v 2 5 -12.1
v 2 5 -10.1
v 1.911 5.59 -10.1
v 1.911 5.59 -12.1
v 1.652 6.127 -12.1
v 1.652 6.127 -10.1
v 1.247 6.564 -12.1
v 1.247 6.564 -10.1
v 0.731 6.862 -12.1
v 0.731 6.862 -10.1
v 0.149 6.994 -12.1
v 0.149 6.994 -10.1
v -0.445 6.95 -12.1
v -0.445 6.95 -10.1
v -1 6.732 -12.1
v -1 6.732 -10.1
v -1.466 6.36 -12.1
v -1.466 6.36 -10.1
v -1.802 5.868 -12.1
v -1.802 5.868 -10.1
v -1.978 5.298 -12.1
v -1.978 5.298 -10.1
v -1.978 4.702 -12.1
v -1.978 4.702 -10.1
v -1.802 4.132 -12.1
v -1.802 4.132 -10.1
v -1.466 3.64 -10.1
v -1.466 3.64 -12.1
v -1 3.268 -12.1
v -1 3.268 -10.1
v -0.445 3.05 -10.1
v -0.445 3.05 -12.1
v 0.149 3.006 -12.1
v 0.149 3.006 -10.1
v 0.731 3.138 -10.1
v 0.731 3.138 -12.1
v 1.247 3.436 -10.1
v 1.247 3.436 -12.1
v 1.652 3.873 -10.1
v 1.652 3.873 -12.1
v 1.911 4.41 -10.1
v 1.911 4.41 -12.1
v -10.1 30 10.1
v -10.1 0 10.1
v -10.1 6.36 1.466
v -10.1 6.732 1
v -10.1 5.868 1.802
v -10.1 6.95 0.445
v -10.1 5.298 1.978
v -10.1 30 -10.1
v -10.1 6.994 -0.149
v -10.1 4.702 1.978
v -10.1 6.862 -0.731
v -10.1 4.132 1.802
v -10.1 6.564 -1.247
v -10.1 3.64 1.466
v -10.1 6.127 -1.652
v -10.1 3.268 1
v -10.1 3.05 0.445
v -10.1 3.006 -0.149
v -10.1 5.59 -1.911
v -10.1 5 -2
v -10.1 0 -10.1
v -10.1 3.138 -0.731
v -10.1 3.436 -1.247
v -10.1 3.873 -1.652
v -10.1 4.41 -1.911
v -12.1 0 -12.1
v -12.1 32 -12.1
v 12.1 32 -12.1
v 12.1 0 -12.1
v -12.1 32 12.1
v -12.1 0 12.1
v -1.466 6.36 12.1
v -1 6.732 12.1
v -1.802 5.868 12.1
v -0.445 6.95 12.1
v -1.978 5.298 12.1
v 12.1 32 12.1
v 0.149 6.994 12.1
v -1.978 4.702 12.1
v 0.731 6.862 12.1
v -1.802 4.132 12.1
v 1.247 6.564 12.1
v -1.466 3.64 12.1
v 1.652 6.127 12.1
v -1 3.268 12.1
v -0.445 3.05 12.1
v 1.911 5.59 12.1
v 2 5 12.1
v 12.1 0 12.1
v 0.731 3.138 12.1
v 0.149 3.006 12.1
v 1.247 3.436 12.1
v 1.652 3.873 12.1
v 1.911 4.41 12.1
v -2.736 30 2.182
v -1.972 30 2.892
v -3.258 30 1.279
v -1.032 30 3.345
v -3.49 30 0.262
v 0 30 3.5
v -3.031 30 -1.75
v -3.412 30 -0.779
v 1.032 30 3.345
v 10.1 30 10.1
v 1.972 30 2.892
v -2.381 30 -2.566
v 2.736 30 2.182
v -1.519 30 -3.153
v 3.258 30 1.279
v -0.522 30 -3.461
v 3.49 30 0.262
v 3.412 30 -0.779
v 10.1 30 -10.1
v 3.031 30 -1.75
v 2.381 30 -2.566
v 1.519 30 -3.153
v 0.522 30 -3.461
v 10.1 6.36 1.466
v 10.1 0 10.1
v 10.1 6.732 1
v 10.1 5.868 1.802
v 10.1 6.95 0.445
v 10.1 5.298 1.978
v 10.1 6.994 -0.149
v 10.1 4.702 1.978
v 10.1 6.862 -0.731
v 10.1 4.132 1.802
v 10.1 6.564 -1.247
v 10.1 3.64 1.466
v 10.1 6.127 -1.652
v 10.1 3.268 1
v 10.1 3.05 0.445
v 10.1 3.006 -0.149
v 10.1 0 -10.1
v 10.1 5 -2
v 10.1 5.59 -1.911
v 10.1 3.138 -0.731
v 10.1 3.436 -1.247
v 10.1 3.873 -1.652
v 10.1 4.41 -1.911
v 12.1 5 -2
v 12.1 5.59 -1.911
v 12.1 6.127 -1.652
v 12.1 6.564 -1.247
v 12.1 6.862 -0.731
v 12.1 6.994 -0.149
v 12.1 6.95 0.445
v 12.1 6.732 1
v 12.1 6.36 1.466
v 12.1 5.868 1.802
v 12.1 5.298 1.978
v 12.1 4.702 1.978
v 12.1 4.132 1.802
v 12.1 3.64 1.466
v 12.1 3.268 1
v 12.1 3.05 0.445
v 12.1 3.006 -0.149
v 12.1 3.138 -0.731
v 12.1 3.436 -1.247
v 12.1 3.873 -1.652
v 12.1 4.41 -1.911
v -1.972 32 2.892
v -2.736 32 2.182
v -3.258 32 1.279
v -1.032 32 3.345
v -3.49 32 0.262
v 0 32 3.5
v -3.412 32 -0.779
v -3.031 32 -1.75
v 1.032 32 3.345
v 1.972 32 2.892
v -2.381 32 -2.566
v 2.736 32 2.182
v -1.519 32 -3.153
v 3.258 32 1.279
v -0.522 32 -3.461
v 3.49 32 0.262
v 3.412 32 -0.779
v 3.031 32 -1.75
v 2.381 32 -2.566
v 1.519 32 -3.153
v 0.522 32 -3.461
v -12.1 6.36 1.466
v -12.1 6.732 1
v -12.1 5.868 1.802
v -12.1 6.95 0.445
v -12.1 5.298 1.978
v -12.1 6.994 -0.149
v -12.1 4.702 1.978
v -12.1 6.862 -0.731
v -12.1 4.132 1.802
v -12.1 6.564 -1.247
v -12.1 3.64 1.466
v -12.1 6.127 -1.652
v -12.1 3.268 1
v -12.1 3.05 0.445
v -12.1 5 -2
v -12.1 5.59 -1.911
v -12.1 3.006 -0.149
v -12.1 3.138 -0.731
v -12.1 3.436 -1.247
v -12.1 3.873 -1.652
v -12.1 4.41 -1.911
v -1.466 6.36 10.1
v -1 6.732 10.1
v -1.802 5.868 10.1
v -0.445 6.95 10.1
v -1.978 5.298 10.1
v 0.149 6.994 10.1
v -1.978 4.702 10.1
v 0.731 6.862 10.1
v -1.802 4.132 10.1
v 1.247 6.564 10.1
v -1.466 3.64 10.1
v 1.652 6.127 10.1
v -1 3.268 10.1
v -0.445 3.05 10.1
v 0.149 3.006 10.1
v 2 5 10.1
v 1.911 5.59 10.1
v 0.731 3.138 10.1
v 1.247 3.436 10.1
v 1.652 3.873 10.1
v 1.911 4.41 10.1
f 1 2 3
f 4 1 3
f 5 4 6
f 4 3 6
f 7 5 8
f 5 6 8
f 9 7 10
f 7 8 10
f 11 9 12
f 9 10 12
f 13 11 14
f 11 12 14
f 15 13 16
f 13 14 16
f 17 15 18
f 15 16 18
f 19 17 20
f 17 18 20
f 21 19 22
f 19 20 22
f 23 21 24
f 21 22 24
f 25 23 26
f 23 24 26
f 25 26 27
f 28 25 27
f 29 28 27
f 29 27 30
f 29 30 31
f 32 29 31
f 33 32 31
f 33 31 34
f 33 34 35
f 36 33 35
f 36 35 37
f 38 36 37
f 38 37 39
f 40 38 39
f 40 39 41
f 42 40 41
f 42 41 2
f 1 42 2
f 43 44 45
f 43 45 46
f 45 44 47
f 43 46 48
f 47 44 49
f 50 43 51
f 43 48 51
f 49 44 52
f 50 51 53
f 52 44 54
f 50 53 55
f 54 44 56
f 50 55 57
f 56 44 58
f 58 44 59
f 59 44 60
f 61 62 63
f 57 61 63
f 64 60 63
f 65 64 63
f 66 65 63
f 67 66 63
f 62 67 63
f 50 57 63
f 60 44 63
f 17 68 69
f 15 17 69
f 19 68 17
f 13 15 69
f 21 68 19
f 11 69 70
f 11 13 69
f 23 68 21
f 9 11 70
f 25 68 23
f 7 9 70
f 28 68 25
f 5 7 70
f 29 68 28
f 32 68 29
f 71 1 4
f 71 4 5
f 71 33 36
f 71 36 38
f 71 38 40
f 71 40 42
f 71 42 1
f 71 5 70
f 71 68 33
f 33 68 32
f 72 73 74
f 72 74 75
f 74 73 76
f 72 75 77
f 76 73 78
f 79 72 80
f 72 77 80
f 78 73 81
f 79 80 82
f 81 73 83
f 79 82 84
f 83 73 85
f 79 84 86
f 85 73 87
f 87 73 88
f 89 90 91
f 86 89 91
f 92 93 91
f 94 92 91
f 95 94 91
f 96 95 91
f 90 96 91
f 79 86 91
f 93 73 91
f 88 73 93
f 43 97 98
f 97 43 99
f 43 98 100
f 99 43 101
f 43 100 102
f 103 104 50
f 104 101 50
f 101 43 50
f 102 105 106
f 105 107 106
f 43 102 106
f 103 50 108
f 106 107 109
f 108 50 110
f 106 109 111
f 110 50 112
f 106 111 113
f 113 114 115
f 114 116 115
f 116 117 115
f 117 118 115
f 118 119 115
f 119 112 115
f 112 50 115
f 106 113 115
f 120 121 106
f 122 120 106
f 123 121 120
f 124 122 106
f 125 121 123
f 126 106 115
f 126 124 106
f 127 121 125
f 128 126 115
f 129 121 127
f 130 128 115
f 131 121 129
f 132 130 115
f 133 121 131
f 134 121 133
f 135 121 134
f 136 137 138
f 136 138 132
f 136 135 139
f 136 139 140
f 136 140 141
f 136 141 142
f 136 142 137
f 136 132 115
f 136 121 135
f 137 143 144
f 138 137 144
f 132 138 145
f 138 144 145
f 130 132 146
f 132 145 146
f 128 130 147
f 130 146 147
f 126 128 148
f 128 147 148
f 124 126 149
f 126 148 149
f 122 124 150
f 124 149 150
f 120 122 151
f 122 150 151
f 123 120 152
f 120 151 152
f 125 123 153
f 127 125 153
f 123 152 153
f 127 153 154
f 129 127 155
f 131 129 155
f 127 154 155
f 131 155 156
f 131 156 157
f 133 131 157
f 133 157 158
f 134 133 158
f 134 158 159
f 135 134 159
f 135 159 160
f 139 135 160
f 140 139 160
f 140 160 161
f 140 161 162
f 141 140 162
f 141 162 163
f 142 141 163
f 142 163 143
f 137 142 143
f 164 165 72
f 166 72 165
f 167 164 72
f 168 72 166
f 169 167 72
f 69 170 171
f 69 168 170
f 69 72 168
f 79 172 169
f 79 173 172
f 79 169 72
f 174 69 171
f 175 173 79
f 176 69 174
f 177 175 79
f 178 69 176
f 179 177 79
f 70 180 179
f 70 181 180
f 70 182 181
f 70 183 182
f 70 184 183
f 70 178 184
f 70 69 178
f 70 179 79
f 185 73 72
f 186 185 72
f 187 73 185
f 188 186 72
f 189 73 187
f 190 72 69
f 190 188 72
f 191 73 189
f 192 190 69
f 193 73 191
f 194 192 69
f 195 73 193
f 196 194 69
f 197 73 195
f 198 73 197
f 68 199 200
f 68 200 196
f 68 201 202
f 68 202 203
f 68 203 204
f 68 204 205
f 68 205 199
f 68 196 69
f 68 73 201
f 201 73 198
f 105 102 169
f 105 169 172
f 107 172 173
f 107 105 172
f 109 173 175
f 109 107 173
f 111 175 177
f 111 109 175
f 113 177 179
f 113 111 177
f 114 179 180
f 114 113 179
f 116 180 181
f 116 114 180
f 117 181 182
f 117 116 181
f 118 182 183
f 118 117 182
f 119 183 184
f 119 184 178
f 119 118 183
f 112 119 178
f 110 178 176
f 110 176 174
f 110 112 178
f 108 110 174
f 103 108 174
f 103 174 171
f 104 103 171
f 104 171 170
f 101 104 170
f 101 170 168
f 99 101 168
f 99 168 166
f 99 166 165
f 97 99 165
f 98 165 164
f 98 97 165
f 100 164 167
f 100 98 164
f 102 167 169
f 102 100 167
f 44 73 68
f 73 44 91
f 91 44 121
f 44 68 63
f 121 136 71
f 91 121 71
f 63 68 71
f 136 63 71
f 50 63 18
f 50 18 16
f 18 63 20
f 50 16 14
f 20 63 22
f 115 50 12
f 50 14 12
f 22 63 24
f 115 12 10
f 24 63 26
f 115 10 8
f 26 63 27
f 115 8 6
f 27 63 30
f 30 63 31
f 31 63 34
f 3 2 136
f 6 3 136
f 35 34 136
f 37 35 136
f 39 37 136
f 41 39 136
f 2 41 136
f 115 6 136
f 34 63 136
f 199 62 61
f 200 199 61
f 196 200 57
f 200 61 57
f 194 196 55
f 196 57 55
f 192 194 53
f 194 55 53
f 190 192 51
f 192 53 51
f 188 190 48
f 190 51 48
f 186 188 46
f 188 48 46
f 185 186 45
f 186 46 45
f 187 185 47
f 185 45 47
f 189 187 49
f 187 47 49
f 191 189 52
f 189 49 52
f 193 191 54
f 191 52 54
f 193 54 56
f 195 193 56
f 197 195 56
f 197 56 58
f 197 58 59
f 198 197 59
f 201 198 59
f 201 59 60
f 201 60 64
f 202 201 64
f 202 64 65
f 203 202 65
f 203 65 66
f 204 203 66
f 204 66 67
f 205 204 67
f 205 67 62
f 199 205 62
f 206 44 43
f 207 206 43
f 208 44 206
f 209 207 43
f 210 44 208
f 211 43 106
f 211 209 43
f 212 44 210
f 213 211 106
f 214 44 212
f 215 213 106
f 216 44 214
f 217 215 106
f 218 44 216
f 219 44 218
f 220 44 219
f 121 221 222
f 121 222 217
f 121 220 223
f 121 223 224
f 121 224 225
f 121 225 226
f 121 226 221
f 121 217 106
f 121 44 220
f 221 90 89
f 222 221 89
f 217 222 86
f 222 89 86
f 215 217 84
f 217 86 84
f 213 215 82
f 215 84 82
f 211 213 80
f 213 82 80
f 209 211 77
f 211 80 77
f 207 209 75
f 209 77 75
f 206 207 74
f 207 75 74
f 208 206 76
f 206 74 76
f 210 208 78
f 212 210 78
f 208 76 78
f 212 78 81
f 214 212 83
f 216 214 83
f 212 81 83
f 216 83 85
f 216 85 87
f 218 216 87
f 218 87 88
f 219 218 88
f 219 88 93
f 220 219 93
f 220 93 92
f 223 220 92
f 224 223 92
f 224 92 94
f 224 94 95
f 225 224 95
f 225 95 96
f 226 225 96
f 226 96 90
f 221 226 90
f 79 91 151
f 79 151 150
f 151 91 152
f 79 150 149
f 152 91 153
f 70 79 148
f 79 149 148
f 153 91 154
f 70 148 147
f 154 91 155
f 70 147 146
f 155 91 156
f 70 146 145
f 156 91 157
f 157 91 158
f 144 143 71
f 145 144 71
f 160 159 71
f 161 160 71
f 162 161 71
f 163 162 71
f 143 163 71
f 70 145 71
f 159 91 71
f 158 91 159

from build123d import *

# Parameters (mm, degrees)
SKETCH1_W           = 24.2
SKETCH1_H           = 24.2
SKETCH1_W_2         = 20.2
SKETCH1_H_2         = 20.2
BOSS_EXTRUDE1_DEPTH = 30
SKETCH2_R           = 2
CUT_EXTRUDE1_DEPTH  = 30
SKETCH3_R           = 2
CUT_EXTRUDE2_DEPTH  = 30
SKETCH4_W           = 24.2
SKETCH4_H           = 24.2
SKETCH4_R           = 3.5
BOSS_EXTRUDE2_DEPTH = 2


with BuildPart() as part:
    # Sketch1 → Boss-Extrude1 (new body)
    with BuildSketch(Plane(origin=(0, 0, 0), x_dir=(1, 0, 0), z_dir=(0, 1, 0))):
        Rectangle(SKETCH1_W, SKETCH1_H)
        Rectangle(SKETCH1_W_2, SKETCH1_H_2, mode=Mode.SUBTRACT)
    extrude(amount=BOSS_EXTRUDE1_DEPTH)

    # Sketch2 → Cut-Extrude1 (cut)
    with BuildSketch(Plane.XY.offset(12.1)):
        with Locations((0, 5)):
            Circle(SKETCH2_R)
    extrude(amount=-CUT_EXTRUDE1_DEPTH, mode=Mode.SUBTRACT)

    # Sketch3 → Cut-Extrude2 (cut)
    with BuildSketch(Plane(origin=(12.1, 0, 0), x_dir=(0, 0, -1), z_dir=(1, 0, 0))):
        with Locations((0, 5)):
            Circle(SKETCH3_R)
    extrude(amount=-CUT_EXTRUDE2_DEPTH, mode=Mode.SUBTRACT)

    # Sketch4 → Boss-Extrude2 (add)
    with BuildSketch(Plane(origin=(0, 30, 0), x_dir=(1, 0, 0), z_dir=(0, 1, 0))):
        Rectangle(SKETCH4_W, SKETCH4_H)
        with Locations(Location((0, 0, 0), (0, 0, 270))):
            Circle(SKETCH4_R, mode=Mode.SUBTRACT)
    extrude(amount=BOSS_EXTRUDE2_DEPTH)


solid = part.part
